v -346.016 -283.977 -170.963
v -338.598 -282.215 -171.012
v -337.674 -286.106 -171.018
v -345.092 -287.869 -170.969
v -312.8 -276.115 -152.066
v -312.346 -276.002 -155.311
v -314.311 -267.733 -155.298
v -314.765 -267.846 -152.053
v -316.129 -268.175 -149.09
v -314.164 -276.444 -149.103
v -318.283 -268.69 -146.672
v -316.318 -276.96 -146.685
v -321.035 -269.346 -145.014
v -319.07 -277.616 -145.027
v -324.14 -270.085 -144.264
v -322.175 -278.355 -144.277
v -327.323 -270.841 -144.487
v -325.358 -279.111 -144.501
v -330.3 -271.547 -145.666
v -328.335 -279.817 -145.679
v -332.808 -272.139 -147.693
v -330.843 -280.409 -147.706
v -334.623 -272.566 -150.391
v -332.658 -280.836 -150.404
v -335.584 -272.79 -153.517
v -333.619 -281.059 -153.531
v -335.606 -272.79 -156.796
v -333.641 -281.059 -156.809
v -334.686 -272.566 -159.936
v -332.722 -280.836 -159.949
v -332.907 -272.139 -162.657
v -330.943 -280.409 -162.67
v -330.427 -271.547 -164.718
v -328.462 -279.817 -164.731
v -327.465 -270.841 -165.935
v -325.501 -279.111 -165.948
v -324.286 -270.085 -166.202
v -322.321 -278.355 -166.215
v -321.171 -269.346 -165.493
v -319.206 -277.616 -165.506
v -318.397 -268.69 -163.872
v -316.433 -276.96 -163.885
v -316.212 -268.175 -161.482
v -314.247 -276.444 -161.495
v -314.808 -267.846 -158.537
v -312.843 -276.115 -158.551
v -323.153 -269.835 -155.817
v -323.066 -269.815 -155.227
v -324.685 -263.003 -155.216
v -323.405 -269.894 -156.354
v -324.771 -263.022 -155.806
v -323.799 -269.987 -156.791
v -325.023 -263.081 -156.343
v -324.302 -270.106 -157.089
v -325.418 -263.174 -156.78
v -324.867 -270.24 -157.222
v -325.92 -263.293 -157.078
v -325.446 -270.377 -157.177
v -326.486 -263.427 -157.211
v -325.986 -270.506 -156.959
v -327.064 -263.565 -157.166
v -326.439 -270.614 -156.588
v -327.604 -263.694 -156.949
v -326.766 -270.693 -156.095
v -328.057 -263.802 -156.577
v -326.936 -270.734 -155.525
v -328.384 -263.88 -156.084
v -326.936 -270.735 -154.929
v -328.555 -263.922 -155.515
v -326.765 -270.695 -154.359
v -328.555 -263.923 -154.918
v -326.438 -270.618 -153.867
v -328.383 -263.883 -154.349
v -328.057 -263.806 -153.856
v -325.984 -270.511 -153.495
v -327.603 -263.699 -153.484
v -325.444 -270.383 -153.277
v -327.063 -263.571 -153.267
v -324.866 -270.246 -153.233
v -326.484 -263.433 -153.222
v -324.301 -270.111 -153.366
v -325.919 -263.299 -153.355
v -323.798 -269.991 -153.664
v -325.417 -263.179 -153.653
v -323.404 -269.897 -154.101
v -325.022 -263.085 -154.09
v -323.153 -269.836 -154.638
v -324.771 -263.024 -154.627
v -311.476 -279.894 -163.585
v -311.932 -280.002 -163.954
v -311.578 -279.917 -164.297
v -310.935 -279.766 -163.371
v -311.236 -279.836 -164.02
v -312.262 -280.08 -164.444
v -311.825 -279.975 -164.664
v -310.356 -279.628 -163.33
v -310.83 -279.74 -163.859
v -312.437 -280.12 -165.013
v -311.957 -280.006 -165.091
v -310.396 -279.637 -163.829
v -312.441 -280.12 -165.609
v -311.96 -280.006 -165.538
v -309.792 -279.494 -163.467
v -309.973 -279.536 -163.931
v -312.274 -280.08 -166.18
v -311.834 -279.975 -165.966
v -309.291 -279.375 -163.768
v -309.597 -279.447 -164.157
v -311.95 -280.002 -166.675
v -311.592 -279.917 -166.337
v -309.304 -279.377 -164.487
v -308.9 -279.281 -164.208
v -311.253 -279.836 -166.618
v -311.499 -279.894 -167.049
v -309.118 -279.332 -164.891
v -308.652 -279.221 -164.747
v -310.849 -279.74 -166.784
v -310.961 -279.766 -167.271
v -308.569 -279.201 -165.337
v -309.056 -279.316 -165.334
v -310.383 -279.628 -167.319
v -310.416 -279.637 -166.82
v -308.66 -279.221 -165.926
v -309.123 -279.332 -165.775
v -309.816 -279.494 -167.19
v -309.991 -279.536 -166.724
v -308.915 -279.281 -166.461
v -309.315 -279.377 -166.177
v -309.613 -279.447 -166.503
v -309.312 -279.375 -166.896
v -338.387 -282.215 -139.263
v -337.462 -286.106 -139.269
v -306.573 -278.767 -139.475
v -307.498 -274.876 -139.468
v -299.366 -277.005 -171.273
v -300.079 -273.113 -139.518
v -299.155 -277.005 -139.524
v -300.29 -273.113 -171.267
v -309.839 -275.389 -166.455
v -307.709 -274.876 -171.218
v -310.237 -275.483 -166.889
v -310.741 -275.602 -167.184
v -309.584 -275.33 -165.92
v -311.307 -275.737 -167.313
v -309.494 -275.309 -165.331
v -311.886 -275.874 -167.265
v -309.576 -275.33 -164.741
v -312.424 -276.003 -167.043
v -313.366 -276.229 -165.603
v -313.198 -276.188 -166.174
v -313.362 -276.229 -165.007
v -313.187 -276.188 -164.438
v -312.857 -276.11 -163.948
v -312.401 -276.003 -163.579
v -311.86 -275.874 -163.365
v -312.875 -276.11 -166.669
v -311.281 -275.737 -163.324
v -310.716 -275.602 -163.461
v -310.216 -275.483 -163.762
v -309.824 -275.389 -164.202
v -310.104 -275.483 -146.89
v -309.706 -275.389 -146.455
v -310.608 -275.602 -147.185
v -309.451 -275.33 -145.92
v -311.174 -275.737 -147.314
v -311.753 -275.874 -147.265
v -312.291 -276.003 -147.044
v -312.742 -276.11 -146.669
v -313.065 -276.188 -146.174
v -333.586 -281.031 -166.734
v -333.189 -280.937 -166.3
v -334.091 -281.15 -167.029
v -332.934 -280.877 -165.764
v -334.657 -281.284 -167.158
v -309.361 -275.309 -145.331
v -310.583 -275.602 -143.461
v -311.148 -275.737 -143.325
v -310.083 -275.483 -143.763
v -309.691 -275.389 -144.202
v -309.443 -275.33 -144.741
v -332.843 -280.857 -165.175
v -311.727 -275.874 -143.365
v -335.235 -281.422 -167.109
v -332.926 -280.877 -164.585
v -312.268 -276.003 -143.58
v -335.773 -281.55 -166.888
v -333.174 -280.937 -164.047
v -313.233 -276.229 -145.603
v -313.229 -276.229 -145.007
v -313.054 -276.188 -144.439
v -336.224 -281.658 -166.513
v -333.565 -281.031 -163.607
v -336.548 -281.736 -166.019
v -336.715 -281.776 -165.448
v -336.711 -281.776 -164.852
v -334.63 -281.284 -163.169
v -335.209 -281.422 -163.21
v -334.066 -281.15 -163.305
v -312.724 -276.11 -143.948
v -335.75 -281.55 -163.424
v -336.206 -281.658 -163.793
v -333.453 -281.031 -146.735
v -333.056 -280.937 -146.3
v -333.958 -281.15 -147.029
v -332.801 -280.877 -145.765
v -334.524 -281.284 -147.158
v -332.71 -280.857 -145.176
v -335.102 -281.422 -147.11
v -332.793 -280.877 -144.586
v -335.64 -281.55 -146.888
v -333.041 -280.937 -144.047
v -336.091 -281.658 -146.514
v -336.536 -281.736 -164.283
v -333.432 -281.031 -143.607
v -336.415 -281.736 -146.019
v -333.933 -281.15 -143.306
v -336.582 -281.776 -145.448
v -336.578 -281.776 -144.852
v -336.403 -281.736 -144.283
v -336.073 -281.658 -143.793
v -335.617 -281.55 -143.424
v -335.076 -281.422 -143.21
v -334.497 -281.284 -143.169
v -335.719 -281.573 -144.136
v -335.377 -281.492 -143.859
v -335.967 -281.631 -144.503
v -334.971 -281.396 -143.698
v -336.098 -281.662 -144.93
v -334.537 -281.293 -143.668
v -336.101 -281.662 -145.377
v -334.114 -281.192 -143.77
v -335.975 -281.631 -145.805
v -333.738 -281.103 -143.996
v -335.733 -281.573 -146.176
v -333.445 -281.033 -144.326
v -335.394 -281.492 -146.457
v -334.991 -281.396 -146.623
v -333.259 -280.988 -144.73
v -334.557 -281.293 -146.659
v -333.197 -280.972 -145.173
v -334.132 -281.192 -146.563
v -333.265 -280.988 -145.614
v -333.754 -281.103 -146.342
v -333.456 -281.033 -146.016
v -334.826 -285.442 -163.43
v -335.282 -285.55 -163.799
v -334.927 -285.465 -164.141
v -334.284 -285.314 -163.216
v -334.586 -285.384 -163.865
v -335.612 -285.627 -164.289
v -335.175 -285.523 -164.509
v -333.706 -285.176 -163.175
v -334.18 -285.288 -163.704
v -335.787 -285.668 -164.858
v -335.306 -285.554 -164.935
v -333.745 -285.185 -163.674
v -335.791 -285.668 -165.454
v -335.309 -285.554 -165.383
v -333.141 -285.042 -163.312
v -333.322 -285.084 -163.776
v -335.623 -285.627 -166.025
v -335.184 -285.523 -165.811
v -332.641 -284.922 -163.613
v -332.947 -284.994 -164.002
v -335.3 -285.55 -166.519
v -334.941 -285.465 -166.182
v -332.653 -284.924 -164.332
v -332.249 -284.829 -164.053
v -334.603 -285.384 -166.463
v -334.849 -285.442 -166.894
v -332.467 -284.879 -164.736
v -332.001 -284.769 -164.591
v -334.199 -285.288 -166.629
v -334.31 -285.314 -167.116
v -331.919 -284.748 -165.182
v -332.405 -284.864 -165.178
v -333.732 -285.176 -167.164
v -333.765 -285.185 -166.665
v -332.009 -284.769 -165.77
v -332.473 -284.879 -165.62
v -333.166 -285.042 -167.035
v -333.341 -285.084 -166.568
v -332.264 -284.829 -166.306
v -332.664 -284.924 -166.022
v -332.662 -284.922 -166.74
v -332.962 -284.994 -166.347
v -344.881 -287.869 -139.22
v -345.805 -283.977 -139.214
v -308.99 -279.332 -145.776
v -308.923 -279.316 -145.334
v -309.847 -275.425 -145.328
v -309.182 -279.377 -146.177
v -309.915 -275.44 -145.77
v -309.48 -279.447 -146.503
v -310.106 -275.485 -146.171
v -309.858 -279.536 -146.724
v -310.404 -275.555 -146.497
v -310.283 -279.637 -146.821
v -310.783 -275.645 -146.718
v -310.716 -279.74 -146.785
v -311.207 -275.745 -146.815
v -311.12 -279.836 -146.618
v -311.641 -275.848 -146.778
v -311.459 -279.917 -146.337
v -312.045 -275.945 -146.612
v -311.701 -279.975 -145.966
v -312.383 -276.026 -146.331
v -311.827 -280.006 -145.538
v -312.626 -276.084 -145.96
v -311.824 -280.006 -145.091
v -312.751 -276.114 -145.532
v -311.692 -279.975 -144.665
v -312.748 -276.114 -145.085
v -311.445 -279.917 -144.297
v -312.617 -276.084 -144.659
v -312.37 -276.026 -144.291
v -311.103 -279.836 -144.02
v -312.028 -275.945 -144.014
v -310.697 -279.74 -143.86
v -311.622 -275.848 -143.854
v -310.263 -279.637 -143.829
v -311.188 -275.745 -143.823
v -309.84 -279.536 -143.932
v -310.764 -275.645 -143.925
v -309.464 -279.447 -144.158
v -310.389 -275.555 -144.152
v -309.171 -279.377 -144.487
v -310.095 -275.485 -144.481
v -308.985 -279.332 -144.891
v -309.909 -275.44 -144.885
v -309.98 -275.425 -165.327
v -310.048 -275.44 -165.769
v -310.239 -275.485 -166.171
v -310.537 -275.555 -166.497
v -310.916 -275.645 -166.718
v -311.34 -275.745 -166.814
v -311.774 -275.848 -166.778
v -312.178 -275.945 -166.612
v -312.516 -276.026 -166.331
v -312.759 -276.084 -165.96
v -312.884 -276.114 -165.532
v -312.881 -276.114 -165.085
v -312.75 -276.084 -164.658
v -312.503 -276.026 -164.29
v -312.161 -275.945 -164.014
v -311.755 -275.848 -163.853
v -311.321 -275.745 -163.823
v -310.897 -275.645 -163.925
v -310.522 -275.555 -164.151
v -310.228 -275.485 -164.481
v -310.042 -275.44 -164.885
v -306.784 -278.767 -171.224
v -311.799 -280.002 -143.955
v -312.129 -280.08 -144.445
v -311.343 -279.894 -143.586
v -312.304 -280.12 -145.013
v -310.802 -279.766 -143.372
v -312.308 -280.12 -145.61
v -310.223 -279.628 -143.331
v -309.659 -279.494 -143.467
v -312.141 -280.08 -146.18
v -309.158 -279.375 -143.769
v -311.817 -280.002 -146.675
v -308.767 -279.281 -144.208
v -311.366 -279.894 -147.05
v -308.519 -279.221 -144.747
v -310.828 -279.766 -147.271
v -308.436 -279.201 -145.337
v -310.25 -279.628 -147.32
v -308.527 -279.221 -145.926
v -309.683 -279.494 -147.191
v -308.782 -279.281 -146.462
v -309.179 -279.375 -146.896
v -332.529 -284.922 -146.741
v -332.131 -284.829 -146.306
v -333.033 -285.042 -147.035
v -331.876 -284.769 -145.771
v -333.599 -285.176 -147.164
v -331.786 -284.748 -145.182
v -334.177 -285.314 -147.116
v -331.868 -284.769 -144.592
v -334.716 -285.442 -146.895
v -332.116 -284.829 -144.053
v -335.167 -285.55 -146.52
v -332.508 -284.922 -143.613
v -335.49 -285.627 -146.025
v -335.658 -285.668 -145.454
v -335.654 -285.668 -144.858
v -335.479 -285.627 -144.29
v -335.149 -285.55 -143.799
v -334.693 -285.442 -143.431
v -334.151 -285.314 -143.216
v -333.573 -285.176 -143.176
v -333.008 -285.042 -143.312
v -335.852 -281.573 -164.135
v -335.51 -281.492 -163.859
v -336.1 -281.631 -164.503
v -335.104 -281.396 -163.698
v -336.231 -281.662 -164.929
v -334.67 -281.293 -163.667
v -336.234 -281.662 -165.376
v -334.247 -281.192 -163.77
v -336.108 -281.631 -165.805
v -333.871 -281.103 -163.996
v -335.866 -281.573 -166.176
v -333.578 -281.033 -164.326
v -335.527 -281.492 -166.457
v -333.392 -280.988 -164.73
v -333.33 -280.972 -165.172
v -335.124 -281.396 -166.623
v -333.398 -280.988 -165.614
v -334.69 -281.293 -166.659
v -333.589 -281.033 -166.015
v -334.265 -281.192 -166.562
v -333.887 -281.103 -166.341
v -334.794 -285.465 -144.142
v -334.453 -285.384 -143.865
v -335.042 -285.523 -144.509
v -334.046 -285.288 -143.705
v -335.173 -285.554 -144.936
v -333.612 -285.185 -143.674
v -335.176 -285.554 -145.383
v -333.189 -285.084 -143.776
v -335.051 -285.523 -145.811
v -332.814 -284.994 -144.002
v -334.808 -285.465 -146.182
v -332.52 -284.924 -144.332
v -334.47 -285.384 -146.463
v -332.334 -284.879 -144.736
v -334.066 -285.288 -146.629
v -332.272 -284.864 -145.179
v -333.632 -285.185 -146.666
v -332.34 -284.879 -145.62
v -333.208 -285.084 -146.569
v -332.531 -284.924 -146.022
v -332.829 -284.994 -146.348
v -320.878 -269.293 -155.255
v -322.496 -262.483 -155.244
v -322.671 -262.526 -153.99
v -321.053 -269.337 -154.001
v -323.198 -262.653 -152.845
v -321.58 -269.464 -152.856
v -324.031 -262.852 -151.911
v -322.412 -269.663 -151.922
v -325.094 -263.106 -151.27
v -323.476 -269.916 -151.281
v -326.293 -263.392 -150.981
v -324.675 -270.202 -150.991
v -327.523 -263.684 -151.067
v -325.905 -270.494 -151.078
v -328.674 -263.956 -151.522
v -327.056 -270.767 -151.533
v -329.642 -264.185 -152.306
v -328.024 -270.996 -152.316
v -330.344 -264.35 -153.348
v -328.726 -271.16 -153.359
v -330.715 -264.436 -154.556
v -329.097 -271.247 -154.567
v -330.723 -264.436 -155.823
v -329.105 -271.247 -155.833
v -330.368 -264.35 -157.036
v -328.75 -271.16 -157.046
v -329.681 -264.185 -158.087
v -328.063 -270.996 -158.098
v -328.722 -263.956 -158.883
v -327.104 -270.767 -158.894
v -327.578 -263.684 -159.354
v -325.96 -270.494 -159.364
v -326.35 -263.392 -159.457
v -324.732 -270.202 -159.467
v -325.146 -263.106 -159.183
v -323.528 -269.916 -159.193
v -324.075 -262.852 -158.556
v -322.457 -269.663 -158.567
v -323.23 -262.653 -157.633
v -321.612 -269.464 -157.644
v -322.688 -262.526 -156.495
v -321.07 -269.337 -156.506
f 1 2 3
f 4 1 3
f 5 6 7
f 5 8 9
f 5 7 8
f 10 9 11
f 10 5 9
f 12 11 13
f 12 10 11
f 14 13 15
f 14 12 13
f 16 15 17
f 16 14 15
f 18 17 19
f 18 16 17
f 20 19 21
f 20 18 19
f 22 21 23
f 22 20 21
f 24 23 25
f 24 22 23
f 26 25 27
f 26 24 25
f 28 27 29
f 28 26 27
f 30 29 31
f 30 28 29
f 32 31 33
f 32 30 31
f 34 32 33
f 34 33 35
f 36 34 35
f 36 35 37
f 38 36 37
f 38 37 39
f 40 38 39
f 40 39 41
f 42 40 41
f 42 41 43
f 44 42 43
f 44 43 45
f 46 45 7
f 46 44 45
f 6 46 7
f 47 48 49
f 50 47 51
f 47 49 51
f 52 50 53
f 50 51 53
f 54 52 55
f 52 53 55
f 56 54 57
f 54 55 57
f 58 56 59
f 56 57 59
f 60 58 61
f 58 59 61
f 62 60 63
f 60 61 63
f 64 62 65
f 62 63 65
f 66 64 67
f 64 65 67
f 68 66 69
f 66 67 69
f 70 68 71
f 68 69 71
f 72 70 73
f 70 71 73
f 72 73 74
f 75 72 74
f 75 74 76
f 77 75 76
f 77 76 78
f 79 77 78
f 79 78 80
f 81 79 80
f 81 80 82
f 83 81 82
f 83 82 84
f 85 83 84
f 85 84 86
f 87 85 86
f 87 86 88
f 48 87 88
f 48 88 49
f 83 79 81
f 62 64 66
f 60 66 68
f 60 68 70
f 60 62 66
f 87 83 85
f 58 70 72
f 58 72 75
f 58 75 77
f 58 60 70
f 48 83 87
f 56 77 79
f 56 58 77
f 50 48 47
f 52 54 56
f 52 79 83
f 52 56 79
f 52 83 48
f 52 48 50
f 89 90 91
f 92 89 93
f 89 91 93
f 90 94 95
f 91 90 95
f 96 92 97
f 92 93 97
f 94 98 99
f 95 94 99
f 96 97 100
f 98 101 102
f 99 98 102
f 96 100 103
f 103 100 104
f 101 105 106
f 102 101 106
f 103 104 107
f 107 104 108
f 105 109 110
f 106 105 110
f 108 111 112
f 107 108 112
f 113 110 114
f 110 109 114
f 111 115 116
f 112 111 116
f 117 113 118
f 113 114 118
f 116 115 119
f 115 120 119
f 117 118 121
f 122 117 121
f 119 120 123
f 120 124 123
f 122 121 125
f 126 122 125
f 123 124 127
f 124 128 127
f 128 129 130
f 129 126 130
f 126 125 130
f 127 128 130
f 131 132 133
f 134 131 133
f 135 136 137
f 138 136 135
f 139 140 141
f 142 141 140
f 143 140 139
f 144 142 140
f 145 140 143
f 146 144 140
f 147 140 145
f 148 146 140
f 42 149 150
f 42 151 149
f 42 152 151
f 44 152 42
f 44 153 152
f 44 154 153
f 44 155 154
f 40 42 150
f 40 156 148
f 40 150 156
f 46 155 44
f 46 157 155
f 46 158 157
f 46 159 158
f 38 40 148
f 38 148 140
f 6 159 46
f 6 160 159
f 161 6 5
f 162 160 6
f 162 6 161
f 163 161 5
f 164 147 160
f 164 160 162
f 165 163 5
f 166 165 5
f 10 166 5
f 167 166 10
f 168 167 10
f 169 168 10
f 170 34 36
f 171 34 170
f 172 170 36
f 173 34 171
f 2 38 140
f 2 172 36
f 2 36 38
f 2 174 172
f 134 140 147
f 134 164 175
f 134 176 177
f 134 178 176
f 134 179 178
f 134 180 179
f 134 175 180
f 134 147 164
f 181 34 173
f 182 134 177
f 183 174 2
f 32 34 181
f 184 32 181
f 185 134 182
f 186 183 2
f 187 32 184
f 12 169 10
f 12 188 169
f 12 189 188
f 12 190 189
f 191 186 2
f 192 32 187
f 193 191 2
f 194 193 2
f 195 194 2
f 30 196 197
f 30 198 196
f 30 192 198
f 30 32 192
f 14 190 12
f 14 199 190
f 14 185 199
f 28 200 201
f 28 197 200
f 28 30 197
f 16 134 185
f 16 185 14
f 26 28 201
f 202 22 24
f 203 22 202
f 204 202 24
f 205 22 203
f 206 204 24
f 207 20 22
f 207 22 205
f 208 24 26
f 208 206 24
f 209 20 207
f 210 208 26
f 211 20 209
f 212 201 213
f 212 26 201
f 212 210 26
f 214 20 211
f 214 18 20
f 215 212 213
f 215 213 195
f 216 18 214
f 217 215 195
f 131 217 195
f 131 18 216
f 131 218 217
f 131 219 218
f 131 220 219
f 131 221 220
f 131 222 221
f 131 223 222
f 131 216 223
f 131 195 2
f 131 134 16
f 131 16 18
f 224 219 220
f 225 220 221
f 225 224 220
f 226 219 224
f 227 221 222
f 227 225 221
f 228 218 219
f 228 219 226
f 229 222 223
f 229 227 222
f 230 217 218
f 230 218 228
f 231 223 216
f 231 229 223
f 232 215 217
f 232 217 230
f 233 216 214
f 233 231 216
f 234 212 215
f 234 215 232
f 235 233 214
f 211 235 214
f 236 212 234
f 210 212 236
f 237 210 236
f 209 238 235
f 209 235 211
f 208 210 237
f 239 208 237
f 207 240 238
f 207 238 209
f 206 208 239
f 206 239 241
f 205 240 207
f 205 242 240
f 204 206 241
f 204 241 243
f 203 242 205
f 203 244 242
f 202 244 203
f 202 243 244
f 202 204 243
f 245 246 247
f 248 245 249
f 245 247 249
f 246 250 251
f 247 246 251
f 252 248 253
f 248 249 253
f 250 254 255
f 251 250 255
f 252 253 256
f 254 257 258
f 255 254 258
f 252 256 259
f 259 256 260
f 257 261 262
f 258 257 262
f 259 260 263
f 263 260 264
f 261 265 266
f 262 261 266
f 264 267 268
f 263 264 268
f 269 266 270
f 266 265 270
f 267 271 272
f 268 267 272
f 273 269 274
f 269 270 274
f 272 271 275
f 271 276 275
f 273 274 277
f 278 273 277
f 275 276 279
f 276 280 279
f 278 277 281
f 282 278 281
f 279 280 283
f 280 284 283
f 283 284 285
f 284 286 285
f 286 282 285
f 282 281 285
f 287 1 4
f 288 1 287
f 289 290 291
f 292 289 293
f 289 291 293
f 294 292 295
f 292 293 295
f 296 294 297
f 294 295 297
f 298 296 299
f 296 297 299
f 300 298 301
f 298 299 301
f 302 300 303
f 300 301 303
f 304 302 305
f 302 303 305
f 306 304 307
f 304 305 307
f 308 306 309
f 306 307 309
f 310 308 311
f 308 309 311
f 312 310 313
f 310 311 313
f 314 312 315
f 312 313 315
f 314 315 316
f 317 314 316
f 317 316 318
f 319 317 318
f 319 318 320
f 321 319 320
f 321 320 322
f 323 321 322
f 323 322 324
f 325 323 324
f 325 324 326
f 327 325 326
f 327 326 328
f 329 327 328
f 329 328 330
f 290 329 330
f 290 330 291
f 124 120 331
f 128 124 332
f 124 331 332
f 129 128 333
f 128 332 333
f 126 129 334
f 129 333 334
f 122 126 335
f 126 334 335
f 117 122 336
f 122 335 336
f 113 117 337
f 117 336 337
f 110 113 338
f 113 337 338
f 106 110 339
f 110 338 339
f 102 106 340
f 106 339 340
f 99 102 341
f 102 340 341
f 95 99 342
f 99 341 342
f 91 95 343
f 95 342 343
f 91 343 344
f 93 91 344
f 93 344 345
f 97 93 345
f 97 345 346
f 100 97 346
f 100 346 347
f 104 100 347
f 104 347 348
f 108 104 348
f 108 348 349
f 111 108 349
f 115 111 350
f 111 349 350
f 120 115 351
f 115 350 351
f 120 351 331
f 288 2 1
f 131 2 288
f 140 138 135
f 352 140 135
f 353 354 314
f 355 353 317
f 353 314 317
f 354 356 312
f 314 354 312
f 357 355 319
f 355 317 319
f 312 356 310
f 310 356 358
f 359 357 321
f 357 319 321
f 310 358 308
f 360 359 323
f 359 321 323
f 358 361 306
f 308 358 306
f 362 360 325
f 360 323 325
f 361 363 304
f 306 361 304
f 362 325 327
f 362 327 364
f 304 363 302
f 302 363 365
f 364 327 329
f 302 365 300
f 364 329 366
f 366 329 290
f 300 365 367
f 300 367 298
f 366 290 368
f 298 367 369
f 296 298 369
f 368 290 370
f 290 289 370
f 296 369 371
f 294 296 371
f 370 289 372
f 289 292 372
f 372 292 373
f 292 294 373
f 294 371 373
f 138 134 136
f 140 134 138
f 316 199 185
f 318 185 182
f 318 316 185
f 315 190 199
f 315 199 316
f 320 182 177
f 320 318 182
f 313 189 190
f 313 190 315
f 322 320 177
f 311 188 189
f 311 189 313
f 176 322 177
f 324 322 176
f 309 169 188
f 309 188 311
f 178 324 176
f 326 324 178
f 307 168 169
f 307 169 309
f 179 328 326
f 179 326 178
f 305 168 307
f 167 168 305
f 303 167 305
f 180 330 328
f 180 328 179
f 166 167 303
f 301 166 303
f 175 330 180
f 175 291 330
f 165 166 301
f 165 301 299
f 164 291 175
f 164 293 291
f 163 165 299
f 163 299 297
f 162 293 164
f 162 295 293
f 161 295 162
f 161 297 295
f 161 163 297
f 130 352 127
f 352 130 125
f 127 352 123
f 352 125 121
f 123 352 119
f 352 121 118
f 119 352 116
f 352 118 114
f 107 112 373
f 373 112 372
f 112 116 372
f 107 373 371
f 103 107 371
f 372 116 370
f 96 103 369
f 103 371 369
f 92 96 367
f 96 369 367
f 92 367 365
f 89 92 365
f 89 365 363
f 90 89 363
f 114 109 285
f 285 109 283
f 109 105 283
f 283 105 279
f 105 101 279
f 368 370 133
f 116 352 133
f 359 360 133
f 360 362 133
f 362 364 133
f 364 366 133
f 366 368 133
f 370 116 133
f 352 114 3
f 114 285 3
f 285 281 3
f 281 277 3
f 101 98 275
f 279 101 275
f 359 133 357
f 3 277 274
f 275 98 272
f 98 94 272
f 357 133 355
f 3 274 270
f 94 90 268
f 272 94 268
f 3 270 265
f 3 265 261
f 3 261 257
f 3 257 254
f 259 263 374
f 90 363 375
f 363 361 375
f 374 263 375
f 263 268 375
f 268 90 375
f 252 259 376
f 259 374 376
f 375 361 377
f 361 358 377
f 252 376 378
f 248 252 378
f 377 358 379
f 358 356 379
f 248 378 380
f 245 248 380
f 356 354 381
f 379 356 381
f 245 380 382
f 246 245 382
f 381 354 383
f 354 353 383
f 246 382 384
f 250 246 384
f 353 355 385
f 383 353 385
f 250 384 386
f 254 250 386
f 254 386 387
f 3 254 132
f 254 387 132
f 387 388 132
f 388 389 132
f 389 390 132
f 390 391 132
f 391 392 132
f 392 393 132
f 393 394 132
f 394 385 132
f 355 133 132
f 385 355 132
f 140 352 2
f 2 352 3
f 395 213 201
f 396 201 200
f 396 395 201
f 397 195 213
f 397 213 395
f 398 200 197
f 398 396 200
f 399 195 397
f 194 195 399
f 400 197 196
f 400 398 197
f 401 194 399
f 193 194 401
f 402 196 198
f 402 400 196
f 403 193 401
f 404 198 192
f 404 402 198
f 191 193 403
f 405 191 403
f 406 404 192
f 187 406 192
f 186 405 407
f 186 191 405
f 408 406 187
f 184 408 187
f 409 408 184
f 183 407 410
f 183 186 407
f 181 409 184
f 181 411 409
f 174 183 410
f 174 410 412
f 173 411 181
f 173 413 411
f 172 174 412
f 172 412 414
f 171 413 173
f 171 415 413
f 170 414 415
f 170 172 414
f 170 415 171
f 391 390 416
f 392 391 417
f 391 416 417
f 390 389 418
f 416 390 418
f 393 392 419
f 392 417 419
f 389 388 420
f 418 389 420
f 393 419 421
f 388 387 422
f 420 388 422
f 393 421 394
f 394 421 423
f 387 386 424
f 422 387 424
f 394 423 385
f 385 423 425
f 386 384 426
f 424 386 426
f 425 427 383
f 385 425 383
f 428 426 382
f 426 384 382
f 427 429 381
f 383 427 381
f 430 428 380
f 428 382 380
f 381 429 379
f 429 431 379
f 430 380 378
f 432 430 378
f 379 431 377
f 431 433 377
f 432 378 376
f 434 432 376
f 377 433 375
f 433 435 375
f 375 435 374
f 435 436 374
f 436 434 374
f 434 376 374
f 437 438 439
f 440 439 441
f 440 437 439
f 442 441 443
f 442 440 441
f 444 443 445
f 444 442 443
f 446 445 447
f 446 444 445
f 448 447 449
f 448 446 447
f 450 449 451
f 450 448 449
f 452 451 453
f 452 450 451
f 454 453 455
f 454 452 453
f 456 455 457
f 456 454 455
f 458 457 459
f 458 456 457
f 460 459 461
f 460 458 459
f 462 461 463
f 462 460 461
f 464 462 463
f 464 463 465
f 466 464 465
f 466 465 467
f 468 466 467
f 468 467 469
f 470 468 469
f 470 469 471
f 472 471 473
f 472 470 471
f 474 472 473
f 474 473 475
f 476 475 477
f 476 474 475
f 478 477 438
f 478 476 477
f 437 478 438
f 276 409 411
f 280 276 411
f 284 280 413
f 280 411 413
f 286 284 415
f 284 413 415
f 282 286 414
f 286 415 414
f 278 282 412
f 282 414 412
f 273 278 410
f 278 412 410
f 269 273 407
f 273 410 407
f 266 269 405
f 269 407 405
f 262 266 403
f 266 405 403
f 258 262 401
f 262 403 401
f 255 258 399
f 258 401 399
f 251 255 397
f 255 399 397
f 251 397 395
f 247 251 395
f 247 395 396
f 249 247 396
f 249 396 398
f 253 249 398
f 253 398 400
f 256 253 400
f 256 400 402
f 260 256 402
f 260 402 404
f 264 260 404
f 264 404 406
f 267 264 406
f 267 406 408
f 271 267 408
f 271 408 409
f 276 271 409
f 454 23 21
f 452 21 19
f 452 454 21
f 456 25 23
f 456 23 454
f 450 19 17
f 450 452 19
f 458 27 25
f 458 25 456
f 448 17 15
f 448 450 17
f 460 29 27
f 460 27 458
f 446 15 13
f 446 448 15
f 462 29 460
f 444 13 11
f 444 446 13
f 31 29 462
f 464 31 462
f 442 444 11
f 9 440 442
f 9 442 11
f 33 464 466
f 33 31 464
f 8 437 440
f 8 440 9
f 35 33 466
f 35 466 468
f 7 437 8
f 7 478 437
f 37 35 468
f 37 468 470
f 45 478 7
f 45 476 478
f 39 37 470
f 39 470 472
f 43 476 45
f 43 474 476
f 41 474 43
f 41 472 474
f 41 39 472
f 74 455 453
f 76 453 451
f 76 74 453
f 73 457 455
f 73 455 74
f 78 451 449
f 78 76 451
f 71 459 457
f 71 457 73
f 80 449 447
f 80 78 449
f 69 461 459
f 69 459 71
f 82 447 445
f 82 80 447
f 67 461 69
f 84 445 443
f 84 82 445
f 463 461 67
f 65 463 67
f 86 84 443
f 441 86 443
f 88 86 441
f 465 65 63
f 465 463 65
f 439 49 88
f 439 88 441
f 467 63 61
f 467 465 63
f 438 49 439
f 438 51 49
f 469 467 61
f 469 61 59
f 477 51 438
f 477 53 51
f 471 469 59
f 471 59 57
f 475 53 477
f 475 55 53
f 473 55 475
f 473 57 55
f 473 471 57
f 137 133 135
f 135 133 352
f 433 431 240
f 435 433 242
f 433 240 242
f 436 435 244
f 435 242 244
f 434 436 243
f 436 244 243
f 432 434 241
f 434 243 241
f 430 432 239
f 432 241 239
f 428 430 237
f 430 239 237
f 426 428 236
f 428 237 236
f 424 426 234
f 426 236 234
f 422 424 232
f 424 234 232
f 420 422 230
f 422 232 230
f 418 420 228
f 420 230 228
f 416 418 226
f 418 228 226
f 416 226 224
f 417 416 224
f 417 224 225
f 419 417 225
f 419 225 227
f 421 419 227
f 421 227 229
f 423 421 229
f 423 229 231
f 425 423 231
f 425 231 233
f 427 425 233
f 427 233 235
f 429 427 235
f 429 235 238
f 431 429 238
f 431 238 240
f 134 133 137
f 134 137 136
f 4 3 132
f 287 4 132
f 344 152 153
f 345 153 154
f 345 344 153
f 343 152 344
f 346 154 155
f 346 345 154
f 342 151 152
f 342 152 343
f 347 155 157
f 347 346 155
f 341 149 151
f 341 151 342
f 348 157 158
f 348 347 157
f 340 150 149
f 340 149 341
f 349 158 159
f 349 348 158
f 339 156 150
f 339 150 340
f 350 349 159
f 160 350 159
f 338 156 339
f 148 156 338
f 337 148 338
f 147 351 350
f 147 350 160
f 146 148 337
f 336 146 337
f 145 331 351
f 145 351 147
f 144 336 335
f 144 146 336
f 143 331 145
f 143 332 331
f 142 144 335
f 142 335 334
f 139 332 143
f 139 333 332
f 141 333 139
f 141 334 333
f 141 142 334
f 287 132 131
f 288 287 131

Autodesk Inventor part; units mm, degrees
ref_plane "РабПлоскость1" through (-284.2189, -273.5664, -69.8717) normal (-0.2311474, 0.9729175, 0.0015373) x (-0.972896, -0.2311526, 0.0064703)
sketch "Эскиз1" plane through (-284.2189, -273.5664, -69.8717) normal (-0.2311474, 0.9729175, 0.0015373) x (-0.972896, -0.2311526, 0.0064703)
  line L0 (22.5, -101.5) -> (54.25, -101.5)
  line L1 (54.25, -101.5) -> (54.25, -69.75)
  line L2 (54.25, -69.75) -> (22.5, -69.75)
  line L3 (22.5, -69.75) -> (22.5, -101.5)
  circle A0 centre (38.375, -85.625) radius 15.75 projected
  line L4 (38.375, -101.375) -> (38.375, -107.7067)
  point P0 (-339.2989, 71.7603)
  point P1 (22.5, -91.5)
  point P2 (38.375, -101.375)
  point P3 (38.375, -102.625)
  dimension "d6" = 12
  dimension "d7" = 10
  dimension "d8" = 4
  dimension "d9" = 4
  dimension "d16" = 12
  dimension "d0" = 31.75
  dimension "d1" = 31.75
extrude "Выдавливание1" add sketch "Эскиз1" along normal blind 4 contours L3 L2 L1 L0 | A0
sketch "Эскиз2" plane through (-285.1435, -269.6747, -69.8655) normal (-0.2311474, 0.9729175, 0.0015373) x (0.972896, 0.2311526, -0.0064703)
  line L0 (-54.25, 101.5) -> (-54.25, 69.75) projected
  line L1 (-54.25, 85.625) -> (-22.5, 85.625)
  line L2 (-22.5, 69.75) -> (-22.5, 101.5) projected
  line L3 (-54.25, 69.75) -> (-22.5, 69.75) projected
  line L4 (-50.375, 85.625) -> (-50.375, 101.5)
  line L5 (-36.5891, 93.625) -> (-22.5, 93.625)
  line L6 (-36.5891, 93.625) -> (-54.25, 93.625)
  line L7 (-50.375, 85.625) -> (-50.375, 68.9602)
  line L8 (-50.375, 75.625) -> (-22.5, 75.625)
  line L9 (-26.375, 103.5) -> (-26.375, 69.75)
  circle A0 centre (-50.375, 75.625) radius 2
  circle A1 centre (-26.375, 75.625) radius 2
  line L10 (-38.375, 72.7459) -> (-38.375, 103.5)
  line L11 (-38.375, 72.7459) -> (-38.375, 69.75)
  point P0 (339.2989, -71.7603)
  point P1 (-49.5, 101.5)
  point P2 (-38.375, 101.5)
  point P3 (-22.5, 85.625)
  point P4 (-54.25, 101.5)
  dimension "d5" = 8
  dimension "d6" = 12
  dimension "d7" = 10
  dimension "d8" = 4
  dimension "d9" = 4
  dimension "d16" = 12
sketch "Эскиз3" plane through (-285.1435, -269.6747, -69.8655) normal (-0.2311474, 0.9729175, 0.0015373) x (0.972896, 0.2311526, -0.0064703)
  circle A0 centre (-50.375, 95.625) radius 2
  circle A1 centre (-26.375, 95.625) radius 2
  line L0 (-54.25, 69.75) -> (-22.5, 69.75) projected
  line L1 (-38.375, 69.75) -> (-38.375, 101.5)
  line L2 (-38.375, 101.5) -> (-54.25, 85.625)
  line L3 (-54.25, 85.625) -> (-22.5, 85.625)
  point P0 (339.2989, -71.7603)
  point P1 (-50.375, 93.5625)
  dimension "d10" = 4
  dimension "d11" = 4
  dimension "d17" = 7.9375
  dimension "d18" = 15.875
  dimension "d19" = 10
  dimension "d20" = 10
  dimension "d21" = 12
extrude "Выдавливание2" cut sketch "Эскиз3" against normal blind 10 contours A0 | A1
extrude "Выдавливание3" cut sketch "Эскиз2" against normal blind 10 contours A0 L8 L7 | L7 A0 | L7 L8 A0 | A1 L8 L9 | L9 L8 A1 | L8 L9 A1 | L9 L8 A1
sketch "Эскиз4" plane through (-285.1435, -269.6747, -69.8655) normal (-0.2311474, 0.9729175, 0.0015373) x (0.972896, 0.2311526, -0.0064703)
  line L0 (-54.25, 101.5) -> (-54.25, 69.75) projected
  line L1 (-54.25, 85.625) -> (-22.5, 85.625)
  line L2 (-22.5, 69.75) -> (-22.5, 101.5) projected
  line L3 (-38.375, 101.5) -> (-38.375, 69.75)
  line L4 (-54.25, 69.75) -> (-22.5, 69.75) projected
  circle A0 centre (-38.375, 85.625) radius 4.25
  point P0 (339.2989, -71.7603)
  dimension "d22" = 8.5
extrude "Выдавливание4" add sketch "Эскиз4" along normal blind 15.5 contours A0 L3 L1 | L1 L3 A0 | L3 A0 L1 | L1 A0 L3
sketch "Эскиз5" plane through (-326.6306, -263.465, -155.2165) normal (-0.2311474, 0.9729175, 0.0015373) x (0.9729187, 0.2311477, 0)
  circle A0 centre (0, 0) radius 2
  point P0 (378.6843, -154.9383)
  dimension "d25" = 4
extrude "Выдавливание5" cut sketch "Эскиз5" against normal blind 7
thread "Резьба1" size "M4x0.7" class "6H" standard "ANSI Metric M Profile" full length
sketch "Эскиз6" plane through (-337.6735, -286.1064, -171.0184) normal (-0.972896, -0.2311526, 0.0064703) x (0.0066504, 0, 0.9999779)
  line L0 (0, 4) -> (31.75, 4) projected
  line L1 (31.75, 4) -> (0, 4)
  line L2 (0, 4) -> (0, 0)
  line L3 (0, 0) -> (31.75, 0)
  line L4 (31.75, 0) -> (31.75, 4)
  point P0 (173.2603, 200.5685)
  point P1 (0, 4)
ref_plane "РабПлоскость2" through (-345.4521, -286.2315, -166.64) normal (0.972896, 0.2311526, -0.0064703) x (-0.2311474, 0.9729175, 0.0015373)
extrude "Выдавливание6" add sketch "Эскиз6" along normal up to surface (7.625 mm away)
sketch "Эскиз7" plane through (-306.5729, -278.7673, -139.4745) normal (0.972896, 0.2311526, -0.0064703) x (-0.0066504, 0, -0.9999779)
  line L0 (0, 0) -> (31.75, 0) projected
  line L1 (0, 4) -> (31.75, 4) projected
  line L2 (31.75, 0) -> (0, 0)
  line L3 (0, 0) -> (0, 4)
  line L4 (0, 4) -> (31.75, 4)
  line L5 (31.75, 4) -> (31.75, 0)
  point P0 (-141.5103, 200.5685)
  point P1 (31.75, 4)
ref_plane "РабПлоскость3" through (-299.726, -275.3674, -166.9441) normal (-0.972896, -0.2311526, 0.0064703) x (0.0066504, 0, 0.9999779)
extrude "Выдавливание7" add sketch "Эскиз7" along normal up to surface (7.625 mm away)
sketch "Эскиз8" plane through (-285.1435, -269.6747, -69.8655) normal (-0.2311474, 0.9729175, 0.0015373) x (0.972896, 0.2311526, -0.0064703)
  circle A0 centre (-38.375, 85.625) radius 4.25 projected
  circle A1 centre (-38.375, 85.625) radius 11
  point P0 (339.2989, -71.7603)
  dimension "d34" = 22
extrude "Выдавливание8" add sketch "Эскиз8" along normal blind 8.5
sketch "Эскиз9" plane through (-285.1435, -269.6747, -69.8655) normal (-0.2311474, 0.9729175, 0.0015373) x (0.972896, 0.2311526, -0.0064703)
  circle A0 centre (-26.375, 75.625) radius 2 projected
  circle A1 centre (-26.375, 95.625) radius 2 projected
  circle A2 centre (-50.375, 75.625) radius 2 projected
  circle A3 centre (-50.375, 95.625) radius 2 projected
  circle A4 centre (-26.375, 75.625) radius 1.5
  circle A5 centre (-26.375, 95.625) radius 1.5
  circle A6 centre (-50.375, 95.625) radius 1.5
  circle A7 centre (-50.375, 75.625) radius 1.5
  point P0 (339.2989, -71.7603)
  dimension "d37" = 3
  dimension "d38" = 3
  dimension "d39" = 3
  dimension "d40" = 3
ref_plane "РабПлоскость4" through (-375.5638, -295.1043, -173.6384) normal (-0.2311474, 0.9729175, 0.0015373) x (0.0066504, 0, 0.9999779)
extrude "Выдавливание9" add sketch "Эскиз9" against normal up to surface (4 mm away)
properties part number "ступица"
